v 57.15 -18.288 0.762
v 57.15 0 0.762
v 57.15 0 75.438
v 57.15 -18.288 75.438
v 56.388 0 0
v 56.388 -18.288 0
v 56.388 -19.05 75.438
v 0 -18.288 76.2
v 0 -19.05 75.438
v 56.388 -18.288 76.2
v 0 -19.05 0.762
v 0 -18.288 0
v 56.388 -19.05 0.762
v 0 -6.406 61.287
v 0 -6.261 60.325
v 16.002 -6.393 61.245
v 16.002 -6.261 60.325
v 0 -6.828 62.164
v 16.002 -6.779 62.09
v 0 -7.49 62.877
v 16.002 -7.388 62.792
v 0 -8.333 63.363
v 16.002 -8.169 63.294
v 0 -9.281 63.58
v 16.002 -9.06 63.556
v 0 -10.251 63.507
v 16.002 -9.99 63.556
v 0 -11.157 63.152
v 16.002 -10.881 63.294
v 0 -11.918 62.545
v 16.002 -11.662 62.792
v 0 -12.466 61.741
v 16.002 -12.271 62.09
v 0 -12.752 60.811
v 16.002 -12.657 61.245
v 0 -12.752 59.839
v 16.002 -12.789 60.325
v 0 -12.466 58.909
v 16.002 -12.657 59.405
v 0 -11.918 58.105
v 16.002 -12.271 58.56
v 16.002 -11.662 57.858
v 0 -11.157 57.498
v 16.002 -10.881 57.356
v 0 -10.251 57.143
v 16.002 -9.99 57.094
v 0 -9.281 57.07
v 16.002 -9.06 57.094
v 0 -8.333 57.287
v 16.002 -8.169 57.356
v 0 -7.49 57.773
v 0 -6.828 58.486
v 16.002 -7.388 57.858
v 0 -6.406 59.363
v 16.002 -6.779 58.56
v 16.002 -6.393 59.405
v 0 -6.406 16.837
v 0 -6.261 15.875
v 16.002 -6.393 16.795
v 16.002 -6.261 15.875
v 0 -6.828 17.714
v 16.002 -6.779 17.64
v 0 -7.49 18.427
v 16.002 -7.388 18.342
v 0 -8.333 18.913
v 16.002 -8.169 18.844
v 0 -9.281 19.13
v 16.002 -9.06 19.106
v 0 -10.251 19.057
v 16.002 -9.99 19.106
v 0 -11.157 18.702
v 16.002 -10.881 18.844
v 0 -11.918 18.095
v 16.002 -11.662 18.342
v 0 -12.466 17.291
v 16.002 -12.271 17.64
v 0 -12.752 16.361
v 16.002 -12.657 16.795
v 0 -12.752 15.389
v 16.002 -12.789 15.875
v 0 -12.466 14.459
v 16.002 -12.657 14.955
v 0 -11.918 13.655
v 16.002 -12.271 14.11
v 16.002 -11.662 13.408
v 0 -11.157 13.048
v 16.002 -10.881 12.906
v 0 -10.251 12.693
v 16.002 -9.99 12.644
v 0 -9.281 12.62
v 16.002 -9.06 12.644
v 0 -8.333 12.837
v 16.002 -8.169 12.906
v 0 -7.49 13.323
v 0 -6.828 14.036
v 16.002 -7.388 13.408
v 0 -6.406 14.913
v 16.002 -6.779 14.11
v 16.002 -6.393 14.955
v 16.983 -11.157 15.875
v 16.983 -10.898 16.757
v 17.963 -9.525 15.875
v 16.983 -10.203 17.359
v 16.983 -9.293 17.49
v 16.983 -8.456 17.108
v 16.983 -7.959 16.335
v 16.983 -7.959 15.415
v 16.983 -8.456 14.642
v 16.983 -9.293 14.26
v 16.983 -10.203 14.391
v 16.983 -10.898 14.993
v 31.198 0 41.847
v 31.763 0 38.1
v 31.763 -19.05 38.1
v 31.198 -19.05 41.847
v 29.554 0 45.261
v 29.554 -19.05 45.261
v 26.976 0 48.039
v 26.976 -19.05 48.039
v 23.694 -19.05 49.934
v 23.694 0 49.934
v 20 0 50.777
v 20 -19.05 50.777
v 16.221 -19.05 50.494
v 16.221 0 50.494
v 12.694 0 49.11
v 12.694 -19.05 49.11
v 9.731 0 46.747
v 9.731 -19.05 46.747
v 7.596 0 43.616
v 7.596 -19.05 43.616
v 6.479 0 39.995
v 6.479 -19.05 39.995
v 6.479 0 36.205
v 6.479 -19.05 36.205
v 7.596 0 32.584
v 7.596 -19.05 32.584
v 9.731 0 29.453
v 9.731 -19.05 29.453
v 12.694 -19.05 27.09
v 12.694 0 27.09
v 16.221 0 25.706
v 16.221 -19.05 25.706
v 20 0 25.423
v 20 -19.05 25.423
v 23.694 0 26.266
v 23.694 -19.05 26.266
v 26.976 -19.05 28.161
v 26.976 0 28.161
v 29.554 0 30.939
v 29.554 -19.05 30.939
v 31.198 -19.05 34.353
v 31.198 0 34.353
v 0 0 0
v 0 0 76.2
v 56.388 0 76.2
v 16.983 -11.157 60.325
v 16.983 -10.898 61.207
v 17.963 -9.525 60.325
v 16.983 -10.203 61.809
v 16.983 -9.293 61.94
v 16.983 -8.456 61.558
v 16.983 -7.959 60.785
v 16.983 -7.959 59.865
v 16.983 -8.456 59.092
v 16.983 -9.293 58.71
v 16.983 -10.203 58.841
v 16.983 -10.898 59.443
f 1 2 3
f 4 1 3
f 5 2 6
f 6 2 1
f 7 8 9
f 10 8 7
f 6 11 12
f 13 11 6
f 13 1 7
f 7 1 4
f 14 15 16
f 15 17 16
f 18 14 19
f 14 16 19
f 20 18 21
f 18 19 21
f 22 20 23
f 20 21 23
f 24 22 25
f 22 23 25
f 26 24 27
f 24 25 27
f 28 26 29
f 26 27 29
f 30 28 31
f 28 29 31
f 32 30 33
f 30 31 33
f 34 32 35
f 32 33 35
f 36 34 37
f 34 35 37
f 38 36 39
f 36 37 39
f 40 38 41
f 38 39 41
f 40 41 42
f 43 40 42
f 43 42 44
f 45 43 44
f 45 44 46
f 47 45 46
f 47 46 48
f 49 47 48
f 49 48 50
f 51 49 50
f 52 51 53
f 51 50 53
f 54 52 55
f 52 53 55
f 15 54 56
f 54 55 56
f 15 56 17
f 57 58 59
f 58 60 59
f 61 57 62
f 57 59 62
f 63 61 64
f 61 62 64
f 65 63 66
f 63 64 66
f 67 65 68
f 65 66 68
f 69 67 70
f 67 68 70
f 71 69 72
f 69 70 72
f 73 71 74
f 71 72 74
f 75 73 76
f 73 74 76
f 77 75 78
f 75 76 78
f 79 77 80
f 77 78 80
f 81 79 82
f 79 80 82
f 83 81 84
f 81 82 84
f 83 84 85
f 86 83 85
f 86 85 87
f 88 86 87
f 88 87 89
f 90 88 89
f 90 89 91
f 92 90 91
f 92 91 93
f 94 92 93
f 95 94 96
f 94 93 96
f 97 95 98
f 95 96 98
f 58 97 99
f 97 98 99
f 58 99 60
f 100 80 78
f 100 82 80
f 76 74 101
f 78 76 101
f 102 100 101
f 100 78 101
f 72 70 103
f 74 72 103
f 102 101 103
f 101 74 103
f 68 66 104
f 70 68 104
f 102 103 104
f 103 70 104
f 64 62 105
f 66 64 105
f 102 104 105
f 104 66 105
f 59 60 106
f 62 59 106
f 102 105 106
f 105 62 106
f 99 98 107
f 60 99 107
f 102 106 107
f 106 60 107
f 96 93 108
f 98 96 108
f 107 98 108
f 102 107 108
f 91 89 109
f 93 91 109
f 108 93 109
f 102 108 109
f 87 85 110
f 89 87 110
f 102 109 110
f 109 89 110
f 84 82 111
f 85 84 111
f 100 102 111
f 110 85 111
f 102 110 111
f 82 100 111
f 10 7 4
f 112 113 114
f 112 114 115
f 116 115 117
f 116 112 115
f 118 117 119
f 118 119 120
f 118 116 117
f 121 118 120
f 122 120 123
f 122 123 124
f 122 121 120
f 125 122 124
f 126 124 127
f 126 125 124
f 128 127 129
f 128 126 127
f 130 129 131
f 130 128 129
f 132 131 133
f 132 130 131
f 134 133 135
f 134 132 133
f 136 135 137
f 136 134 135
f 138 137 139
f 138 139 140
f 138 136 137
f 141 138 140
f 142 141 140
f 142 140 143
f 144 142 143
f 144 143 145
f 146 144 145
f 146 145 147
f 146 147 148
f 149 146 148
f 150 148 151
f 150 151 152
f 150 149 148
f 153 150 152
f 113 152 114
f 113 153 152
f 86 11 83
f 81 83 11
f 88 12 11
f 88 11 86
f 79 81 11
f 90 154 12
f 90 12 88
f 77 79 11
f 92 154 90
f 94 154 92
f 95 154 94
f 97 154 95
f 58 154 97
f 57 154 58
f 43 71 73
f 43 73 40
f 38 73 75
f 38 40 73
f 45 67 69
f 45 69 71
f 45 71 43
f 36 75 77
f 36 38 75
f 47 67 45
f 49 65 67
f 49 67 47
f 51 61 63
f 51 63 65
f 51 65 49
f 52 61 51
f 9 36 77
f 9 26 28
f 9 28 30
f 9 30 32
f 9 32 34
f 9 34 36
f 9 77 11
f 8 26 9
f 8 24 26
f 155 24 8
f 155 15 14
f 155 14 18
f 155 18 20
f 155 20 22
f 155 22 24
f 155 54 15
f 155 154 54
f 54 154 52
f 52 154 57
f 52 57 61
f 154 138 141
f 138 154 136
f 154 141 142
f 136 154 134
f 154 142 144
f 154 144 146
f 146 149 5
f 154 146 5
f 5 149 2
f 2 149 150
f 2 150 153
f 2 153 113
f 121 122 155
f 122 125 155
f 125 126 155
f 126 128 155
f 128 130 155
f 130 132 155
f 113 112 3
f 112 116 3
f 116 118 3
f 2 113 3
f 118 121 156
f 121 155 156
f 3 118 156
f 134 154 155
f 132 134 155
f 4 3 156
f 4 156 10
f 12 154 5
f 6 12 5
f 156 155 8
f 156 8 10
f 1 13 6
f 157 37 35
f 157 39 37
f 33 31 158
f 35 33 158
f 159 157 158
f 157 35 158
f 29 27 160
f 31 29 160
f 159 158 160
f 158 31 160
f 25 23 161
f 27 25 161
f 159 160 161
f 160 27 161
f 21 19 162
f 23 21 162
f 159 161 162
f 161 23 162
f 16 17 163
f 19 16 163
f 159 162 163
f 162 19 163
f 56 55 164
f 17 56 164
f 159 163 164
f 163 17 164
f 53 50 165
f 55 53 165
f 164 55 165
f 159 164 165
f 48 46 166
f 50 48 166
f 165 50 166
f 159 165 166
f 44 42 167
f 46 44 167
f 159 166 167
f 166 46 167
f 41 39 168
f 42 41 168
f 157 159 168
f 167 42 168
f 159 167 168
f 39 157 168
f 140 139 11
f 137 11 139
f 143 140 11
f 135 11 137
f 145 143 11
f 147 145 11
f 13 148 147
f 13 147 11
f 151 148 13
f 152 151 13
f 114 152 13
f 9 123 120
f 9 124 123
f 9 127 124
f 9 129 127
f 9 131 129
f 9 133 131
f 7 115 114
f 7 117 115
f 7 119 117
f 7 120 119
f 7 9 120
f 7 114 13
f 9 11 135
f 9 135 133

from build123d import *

# Parameters (mm, degrees)
F0_W     = 57.15
F0_H     = 76.2
F0_R     = 12.7127
F1_DEPTH = 19.05
F3_D     = 6.5278
F3_DEPTH = 16.002
F3_TIP   = 1.9611489744
F4_SIZE2 = 0.762
F4_SIZE  = 0.762


with BuildPart() as f1:
    # F0 (on Front) → F1 (new body)
    with BuildSketch(Plane.XZ):
        with Locations((28.575, 38.1)):
            Rectangle(F0_W, F0_H)
        with Locations((19.05, 38.1)):
            Circle(F0_R, mode=Mode.SUBTRACT)
    extrude(amount=F1_DEPTH)

    # F3
    with Locations(Plane(origin=(0, 0, 0), x_dir=(0, -1, 0), z_dir=(-1, 0, 0))):
        with Locations((9.525, 60.325), (9.525, 15.875)):
            Hole(F3_D / 2, depth=F3_DEPTH)
            with Locations((0, 0, -(F3_DEPTH + F3_TIP / 2))):  # 118° drill point
                Cone(0, F3_D / 2, F3_TIP, mode=Mode.SUBTRACT)

    # F4
    f4_edges = [f1.edges().sort_by_distance(p)[0] for p in [
        (57.15, -19.05, 38.1),
        (28.575, -19.05, 76.2),
        (28.575, -19.05, 0),
        (57.15, -9.525, 76.2),
        (57.15, -9.525, 0),
    ]]
    chamfer(f4_edges, length=F4_SIZE, length2=F4_SIZE2)


solid = f1.part
